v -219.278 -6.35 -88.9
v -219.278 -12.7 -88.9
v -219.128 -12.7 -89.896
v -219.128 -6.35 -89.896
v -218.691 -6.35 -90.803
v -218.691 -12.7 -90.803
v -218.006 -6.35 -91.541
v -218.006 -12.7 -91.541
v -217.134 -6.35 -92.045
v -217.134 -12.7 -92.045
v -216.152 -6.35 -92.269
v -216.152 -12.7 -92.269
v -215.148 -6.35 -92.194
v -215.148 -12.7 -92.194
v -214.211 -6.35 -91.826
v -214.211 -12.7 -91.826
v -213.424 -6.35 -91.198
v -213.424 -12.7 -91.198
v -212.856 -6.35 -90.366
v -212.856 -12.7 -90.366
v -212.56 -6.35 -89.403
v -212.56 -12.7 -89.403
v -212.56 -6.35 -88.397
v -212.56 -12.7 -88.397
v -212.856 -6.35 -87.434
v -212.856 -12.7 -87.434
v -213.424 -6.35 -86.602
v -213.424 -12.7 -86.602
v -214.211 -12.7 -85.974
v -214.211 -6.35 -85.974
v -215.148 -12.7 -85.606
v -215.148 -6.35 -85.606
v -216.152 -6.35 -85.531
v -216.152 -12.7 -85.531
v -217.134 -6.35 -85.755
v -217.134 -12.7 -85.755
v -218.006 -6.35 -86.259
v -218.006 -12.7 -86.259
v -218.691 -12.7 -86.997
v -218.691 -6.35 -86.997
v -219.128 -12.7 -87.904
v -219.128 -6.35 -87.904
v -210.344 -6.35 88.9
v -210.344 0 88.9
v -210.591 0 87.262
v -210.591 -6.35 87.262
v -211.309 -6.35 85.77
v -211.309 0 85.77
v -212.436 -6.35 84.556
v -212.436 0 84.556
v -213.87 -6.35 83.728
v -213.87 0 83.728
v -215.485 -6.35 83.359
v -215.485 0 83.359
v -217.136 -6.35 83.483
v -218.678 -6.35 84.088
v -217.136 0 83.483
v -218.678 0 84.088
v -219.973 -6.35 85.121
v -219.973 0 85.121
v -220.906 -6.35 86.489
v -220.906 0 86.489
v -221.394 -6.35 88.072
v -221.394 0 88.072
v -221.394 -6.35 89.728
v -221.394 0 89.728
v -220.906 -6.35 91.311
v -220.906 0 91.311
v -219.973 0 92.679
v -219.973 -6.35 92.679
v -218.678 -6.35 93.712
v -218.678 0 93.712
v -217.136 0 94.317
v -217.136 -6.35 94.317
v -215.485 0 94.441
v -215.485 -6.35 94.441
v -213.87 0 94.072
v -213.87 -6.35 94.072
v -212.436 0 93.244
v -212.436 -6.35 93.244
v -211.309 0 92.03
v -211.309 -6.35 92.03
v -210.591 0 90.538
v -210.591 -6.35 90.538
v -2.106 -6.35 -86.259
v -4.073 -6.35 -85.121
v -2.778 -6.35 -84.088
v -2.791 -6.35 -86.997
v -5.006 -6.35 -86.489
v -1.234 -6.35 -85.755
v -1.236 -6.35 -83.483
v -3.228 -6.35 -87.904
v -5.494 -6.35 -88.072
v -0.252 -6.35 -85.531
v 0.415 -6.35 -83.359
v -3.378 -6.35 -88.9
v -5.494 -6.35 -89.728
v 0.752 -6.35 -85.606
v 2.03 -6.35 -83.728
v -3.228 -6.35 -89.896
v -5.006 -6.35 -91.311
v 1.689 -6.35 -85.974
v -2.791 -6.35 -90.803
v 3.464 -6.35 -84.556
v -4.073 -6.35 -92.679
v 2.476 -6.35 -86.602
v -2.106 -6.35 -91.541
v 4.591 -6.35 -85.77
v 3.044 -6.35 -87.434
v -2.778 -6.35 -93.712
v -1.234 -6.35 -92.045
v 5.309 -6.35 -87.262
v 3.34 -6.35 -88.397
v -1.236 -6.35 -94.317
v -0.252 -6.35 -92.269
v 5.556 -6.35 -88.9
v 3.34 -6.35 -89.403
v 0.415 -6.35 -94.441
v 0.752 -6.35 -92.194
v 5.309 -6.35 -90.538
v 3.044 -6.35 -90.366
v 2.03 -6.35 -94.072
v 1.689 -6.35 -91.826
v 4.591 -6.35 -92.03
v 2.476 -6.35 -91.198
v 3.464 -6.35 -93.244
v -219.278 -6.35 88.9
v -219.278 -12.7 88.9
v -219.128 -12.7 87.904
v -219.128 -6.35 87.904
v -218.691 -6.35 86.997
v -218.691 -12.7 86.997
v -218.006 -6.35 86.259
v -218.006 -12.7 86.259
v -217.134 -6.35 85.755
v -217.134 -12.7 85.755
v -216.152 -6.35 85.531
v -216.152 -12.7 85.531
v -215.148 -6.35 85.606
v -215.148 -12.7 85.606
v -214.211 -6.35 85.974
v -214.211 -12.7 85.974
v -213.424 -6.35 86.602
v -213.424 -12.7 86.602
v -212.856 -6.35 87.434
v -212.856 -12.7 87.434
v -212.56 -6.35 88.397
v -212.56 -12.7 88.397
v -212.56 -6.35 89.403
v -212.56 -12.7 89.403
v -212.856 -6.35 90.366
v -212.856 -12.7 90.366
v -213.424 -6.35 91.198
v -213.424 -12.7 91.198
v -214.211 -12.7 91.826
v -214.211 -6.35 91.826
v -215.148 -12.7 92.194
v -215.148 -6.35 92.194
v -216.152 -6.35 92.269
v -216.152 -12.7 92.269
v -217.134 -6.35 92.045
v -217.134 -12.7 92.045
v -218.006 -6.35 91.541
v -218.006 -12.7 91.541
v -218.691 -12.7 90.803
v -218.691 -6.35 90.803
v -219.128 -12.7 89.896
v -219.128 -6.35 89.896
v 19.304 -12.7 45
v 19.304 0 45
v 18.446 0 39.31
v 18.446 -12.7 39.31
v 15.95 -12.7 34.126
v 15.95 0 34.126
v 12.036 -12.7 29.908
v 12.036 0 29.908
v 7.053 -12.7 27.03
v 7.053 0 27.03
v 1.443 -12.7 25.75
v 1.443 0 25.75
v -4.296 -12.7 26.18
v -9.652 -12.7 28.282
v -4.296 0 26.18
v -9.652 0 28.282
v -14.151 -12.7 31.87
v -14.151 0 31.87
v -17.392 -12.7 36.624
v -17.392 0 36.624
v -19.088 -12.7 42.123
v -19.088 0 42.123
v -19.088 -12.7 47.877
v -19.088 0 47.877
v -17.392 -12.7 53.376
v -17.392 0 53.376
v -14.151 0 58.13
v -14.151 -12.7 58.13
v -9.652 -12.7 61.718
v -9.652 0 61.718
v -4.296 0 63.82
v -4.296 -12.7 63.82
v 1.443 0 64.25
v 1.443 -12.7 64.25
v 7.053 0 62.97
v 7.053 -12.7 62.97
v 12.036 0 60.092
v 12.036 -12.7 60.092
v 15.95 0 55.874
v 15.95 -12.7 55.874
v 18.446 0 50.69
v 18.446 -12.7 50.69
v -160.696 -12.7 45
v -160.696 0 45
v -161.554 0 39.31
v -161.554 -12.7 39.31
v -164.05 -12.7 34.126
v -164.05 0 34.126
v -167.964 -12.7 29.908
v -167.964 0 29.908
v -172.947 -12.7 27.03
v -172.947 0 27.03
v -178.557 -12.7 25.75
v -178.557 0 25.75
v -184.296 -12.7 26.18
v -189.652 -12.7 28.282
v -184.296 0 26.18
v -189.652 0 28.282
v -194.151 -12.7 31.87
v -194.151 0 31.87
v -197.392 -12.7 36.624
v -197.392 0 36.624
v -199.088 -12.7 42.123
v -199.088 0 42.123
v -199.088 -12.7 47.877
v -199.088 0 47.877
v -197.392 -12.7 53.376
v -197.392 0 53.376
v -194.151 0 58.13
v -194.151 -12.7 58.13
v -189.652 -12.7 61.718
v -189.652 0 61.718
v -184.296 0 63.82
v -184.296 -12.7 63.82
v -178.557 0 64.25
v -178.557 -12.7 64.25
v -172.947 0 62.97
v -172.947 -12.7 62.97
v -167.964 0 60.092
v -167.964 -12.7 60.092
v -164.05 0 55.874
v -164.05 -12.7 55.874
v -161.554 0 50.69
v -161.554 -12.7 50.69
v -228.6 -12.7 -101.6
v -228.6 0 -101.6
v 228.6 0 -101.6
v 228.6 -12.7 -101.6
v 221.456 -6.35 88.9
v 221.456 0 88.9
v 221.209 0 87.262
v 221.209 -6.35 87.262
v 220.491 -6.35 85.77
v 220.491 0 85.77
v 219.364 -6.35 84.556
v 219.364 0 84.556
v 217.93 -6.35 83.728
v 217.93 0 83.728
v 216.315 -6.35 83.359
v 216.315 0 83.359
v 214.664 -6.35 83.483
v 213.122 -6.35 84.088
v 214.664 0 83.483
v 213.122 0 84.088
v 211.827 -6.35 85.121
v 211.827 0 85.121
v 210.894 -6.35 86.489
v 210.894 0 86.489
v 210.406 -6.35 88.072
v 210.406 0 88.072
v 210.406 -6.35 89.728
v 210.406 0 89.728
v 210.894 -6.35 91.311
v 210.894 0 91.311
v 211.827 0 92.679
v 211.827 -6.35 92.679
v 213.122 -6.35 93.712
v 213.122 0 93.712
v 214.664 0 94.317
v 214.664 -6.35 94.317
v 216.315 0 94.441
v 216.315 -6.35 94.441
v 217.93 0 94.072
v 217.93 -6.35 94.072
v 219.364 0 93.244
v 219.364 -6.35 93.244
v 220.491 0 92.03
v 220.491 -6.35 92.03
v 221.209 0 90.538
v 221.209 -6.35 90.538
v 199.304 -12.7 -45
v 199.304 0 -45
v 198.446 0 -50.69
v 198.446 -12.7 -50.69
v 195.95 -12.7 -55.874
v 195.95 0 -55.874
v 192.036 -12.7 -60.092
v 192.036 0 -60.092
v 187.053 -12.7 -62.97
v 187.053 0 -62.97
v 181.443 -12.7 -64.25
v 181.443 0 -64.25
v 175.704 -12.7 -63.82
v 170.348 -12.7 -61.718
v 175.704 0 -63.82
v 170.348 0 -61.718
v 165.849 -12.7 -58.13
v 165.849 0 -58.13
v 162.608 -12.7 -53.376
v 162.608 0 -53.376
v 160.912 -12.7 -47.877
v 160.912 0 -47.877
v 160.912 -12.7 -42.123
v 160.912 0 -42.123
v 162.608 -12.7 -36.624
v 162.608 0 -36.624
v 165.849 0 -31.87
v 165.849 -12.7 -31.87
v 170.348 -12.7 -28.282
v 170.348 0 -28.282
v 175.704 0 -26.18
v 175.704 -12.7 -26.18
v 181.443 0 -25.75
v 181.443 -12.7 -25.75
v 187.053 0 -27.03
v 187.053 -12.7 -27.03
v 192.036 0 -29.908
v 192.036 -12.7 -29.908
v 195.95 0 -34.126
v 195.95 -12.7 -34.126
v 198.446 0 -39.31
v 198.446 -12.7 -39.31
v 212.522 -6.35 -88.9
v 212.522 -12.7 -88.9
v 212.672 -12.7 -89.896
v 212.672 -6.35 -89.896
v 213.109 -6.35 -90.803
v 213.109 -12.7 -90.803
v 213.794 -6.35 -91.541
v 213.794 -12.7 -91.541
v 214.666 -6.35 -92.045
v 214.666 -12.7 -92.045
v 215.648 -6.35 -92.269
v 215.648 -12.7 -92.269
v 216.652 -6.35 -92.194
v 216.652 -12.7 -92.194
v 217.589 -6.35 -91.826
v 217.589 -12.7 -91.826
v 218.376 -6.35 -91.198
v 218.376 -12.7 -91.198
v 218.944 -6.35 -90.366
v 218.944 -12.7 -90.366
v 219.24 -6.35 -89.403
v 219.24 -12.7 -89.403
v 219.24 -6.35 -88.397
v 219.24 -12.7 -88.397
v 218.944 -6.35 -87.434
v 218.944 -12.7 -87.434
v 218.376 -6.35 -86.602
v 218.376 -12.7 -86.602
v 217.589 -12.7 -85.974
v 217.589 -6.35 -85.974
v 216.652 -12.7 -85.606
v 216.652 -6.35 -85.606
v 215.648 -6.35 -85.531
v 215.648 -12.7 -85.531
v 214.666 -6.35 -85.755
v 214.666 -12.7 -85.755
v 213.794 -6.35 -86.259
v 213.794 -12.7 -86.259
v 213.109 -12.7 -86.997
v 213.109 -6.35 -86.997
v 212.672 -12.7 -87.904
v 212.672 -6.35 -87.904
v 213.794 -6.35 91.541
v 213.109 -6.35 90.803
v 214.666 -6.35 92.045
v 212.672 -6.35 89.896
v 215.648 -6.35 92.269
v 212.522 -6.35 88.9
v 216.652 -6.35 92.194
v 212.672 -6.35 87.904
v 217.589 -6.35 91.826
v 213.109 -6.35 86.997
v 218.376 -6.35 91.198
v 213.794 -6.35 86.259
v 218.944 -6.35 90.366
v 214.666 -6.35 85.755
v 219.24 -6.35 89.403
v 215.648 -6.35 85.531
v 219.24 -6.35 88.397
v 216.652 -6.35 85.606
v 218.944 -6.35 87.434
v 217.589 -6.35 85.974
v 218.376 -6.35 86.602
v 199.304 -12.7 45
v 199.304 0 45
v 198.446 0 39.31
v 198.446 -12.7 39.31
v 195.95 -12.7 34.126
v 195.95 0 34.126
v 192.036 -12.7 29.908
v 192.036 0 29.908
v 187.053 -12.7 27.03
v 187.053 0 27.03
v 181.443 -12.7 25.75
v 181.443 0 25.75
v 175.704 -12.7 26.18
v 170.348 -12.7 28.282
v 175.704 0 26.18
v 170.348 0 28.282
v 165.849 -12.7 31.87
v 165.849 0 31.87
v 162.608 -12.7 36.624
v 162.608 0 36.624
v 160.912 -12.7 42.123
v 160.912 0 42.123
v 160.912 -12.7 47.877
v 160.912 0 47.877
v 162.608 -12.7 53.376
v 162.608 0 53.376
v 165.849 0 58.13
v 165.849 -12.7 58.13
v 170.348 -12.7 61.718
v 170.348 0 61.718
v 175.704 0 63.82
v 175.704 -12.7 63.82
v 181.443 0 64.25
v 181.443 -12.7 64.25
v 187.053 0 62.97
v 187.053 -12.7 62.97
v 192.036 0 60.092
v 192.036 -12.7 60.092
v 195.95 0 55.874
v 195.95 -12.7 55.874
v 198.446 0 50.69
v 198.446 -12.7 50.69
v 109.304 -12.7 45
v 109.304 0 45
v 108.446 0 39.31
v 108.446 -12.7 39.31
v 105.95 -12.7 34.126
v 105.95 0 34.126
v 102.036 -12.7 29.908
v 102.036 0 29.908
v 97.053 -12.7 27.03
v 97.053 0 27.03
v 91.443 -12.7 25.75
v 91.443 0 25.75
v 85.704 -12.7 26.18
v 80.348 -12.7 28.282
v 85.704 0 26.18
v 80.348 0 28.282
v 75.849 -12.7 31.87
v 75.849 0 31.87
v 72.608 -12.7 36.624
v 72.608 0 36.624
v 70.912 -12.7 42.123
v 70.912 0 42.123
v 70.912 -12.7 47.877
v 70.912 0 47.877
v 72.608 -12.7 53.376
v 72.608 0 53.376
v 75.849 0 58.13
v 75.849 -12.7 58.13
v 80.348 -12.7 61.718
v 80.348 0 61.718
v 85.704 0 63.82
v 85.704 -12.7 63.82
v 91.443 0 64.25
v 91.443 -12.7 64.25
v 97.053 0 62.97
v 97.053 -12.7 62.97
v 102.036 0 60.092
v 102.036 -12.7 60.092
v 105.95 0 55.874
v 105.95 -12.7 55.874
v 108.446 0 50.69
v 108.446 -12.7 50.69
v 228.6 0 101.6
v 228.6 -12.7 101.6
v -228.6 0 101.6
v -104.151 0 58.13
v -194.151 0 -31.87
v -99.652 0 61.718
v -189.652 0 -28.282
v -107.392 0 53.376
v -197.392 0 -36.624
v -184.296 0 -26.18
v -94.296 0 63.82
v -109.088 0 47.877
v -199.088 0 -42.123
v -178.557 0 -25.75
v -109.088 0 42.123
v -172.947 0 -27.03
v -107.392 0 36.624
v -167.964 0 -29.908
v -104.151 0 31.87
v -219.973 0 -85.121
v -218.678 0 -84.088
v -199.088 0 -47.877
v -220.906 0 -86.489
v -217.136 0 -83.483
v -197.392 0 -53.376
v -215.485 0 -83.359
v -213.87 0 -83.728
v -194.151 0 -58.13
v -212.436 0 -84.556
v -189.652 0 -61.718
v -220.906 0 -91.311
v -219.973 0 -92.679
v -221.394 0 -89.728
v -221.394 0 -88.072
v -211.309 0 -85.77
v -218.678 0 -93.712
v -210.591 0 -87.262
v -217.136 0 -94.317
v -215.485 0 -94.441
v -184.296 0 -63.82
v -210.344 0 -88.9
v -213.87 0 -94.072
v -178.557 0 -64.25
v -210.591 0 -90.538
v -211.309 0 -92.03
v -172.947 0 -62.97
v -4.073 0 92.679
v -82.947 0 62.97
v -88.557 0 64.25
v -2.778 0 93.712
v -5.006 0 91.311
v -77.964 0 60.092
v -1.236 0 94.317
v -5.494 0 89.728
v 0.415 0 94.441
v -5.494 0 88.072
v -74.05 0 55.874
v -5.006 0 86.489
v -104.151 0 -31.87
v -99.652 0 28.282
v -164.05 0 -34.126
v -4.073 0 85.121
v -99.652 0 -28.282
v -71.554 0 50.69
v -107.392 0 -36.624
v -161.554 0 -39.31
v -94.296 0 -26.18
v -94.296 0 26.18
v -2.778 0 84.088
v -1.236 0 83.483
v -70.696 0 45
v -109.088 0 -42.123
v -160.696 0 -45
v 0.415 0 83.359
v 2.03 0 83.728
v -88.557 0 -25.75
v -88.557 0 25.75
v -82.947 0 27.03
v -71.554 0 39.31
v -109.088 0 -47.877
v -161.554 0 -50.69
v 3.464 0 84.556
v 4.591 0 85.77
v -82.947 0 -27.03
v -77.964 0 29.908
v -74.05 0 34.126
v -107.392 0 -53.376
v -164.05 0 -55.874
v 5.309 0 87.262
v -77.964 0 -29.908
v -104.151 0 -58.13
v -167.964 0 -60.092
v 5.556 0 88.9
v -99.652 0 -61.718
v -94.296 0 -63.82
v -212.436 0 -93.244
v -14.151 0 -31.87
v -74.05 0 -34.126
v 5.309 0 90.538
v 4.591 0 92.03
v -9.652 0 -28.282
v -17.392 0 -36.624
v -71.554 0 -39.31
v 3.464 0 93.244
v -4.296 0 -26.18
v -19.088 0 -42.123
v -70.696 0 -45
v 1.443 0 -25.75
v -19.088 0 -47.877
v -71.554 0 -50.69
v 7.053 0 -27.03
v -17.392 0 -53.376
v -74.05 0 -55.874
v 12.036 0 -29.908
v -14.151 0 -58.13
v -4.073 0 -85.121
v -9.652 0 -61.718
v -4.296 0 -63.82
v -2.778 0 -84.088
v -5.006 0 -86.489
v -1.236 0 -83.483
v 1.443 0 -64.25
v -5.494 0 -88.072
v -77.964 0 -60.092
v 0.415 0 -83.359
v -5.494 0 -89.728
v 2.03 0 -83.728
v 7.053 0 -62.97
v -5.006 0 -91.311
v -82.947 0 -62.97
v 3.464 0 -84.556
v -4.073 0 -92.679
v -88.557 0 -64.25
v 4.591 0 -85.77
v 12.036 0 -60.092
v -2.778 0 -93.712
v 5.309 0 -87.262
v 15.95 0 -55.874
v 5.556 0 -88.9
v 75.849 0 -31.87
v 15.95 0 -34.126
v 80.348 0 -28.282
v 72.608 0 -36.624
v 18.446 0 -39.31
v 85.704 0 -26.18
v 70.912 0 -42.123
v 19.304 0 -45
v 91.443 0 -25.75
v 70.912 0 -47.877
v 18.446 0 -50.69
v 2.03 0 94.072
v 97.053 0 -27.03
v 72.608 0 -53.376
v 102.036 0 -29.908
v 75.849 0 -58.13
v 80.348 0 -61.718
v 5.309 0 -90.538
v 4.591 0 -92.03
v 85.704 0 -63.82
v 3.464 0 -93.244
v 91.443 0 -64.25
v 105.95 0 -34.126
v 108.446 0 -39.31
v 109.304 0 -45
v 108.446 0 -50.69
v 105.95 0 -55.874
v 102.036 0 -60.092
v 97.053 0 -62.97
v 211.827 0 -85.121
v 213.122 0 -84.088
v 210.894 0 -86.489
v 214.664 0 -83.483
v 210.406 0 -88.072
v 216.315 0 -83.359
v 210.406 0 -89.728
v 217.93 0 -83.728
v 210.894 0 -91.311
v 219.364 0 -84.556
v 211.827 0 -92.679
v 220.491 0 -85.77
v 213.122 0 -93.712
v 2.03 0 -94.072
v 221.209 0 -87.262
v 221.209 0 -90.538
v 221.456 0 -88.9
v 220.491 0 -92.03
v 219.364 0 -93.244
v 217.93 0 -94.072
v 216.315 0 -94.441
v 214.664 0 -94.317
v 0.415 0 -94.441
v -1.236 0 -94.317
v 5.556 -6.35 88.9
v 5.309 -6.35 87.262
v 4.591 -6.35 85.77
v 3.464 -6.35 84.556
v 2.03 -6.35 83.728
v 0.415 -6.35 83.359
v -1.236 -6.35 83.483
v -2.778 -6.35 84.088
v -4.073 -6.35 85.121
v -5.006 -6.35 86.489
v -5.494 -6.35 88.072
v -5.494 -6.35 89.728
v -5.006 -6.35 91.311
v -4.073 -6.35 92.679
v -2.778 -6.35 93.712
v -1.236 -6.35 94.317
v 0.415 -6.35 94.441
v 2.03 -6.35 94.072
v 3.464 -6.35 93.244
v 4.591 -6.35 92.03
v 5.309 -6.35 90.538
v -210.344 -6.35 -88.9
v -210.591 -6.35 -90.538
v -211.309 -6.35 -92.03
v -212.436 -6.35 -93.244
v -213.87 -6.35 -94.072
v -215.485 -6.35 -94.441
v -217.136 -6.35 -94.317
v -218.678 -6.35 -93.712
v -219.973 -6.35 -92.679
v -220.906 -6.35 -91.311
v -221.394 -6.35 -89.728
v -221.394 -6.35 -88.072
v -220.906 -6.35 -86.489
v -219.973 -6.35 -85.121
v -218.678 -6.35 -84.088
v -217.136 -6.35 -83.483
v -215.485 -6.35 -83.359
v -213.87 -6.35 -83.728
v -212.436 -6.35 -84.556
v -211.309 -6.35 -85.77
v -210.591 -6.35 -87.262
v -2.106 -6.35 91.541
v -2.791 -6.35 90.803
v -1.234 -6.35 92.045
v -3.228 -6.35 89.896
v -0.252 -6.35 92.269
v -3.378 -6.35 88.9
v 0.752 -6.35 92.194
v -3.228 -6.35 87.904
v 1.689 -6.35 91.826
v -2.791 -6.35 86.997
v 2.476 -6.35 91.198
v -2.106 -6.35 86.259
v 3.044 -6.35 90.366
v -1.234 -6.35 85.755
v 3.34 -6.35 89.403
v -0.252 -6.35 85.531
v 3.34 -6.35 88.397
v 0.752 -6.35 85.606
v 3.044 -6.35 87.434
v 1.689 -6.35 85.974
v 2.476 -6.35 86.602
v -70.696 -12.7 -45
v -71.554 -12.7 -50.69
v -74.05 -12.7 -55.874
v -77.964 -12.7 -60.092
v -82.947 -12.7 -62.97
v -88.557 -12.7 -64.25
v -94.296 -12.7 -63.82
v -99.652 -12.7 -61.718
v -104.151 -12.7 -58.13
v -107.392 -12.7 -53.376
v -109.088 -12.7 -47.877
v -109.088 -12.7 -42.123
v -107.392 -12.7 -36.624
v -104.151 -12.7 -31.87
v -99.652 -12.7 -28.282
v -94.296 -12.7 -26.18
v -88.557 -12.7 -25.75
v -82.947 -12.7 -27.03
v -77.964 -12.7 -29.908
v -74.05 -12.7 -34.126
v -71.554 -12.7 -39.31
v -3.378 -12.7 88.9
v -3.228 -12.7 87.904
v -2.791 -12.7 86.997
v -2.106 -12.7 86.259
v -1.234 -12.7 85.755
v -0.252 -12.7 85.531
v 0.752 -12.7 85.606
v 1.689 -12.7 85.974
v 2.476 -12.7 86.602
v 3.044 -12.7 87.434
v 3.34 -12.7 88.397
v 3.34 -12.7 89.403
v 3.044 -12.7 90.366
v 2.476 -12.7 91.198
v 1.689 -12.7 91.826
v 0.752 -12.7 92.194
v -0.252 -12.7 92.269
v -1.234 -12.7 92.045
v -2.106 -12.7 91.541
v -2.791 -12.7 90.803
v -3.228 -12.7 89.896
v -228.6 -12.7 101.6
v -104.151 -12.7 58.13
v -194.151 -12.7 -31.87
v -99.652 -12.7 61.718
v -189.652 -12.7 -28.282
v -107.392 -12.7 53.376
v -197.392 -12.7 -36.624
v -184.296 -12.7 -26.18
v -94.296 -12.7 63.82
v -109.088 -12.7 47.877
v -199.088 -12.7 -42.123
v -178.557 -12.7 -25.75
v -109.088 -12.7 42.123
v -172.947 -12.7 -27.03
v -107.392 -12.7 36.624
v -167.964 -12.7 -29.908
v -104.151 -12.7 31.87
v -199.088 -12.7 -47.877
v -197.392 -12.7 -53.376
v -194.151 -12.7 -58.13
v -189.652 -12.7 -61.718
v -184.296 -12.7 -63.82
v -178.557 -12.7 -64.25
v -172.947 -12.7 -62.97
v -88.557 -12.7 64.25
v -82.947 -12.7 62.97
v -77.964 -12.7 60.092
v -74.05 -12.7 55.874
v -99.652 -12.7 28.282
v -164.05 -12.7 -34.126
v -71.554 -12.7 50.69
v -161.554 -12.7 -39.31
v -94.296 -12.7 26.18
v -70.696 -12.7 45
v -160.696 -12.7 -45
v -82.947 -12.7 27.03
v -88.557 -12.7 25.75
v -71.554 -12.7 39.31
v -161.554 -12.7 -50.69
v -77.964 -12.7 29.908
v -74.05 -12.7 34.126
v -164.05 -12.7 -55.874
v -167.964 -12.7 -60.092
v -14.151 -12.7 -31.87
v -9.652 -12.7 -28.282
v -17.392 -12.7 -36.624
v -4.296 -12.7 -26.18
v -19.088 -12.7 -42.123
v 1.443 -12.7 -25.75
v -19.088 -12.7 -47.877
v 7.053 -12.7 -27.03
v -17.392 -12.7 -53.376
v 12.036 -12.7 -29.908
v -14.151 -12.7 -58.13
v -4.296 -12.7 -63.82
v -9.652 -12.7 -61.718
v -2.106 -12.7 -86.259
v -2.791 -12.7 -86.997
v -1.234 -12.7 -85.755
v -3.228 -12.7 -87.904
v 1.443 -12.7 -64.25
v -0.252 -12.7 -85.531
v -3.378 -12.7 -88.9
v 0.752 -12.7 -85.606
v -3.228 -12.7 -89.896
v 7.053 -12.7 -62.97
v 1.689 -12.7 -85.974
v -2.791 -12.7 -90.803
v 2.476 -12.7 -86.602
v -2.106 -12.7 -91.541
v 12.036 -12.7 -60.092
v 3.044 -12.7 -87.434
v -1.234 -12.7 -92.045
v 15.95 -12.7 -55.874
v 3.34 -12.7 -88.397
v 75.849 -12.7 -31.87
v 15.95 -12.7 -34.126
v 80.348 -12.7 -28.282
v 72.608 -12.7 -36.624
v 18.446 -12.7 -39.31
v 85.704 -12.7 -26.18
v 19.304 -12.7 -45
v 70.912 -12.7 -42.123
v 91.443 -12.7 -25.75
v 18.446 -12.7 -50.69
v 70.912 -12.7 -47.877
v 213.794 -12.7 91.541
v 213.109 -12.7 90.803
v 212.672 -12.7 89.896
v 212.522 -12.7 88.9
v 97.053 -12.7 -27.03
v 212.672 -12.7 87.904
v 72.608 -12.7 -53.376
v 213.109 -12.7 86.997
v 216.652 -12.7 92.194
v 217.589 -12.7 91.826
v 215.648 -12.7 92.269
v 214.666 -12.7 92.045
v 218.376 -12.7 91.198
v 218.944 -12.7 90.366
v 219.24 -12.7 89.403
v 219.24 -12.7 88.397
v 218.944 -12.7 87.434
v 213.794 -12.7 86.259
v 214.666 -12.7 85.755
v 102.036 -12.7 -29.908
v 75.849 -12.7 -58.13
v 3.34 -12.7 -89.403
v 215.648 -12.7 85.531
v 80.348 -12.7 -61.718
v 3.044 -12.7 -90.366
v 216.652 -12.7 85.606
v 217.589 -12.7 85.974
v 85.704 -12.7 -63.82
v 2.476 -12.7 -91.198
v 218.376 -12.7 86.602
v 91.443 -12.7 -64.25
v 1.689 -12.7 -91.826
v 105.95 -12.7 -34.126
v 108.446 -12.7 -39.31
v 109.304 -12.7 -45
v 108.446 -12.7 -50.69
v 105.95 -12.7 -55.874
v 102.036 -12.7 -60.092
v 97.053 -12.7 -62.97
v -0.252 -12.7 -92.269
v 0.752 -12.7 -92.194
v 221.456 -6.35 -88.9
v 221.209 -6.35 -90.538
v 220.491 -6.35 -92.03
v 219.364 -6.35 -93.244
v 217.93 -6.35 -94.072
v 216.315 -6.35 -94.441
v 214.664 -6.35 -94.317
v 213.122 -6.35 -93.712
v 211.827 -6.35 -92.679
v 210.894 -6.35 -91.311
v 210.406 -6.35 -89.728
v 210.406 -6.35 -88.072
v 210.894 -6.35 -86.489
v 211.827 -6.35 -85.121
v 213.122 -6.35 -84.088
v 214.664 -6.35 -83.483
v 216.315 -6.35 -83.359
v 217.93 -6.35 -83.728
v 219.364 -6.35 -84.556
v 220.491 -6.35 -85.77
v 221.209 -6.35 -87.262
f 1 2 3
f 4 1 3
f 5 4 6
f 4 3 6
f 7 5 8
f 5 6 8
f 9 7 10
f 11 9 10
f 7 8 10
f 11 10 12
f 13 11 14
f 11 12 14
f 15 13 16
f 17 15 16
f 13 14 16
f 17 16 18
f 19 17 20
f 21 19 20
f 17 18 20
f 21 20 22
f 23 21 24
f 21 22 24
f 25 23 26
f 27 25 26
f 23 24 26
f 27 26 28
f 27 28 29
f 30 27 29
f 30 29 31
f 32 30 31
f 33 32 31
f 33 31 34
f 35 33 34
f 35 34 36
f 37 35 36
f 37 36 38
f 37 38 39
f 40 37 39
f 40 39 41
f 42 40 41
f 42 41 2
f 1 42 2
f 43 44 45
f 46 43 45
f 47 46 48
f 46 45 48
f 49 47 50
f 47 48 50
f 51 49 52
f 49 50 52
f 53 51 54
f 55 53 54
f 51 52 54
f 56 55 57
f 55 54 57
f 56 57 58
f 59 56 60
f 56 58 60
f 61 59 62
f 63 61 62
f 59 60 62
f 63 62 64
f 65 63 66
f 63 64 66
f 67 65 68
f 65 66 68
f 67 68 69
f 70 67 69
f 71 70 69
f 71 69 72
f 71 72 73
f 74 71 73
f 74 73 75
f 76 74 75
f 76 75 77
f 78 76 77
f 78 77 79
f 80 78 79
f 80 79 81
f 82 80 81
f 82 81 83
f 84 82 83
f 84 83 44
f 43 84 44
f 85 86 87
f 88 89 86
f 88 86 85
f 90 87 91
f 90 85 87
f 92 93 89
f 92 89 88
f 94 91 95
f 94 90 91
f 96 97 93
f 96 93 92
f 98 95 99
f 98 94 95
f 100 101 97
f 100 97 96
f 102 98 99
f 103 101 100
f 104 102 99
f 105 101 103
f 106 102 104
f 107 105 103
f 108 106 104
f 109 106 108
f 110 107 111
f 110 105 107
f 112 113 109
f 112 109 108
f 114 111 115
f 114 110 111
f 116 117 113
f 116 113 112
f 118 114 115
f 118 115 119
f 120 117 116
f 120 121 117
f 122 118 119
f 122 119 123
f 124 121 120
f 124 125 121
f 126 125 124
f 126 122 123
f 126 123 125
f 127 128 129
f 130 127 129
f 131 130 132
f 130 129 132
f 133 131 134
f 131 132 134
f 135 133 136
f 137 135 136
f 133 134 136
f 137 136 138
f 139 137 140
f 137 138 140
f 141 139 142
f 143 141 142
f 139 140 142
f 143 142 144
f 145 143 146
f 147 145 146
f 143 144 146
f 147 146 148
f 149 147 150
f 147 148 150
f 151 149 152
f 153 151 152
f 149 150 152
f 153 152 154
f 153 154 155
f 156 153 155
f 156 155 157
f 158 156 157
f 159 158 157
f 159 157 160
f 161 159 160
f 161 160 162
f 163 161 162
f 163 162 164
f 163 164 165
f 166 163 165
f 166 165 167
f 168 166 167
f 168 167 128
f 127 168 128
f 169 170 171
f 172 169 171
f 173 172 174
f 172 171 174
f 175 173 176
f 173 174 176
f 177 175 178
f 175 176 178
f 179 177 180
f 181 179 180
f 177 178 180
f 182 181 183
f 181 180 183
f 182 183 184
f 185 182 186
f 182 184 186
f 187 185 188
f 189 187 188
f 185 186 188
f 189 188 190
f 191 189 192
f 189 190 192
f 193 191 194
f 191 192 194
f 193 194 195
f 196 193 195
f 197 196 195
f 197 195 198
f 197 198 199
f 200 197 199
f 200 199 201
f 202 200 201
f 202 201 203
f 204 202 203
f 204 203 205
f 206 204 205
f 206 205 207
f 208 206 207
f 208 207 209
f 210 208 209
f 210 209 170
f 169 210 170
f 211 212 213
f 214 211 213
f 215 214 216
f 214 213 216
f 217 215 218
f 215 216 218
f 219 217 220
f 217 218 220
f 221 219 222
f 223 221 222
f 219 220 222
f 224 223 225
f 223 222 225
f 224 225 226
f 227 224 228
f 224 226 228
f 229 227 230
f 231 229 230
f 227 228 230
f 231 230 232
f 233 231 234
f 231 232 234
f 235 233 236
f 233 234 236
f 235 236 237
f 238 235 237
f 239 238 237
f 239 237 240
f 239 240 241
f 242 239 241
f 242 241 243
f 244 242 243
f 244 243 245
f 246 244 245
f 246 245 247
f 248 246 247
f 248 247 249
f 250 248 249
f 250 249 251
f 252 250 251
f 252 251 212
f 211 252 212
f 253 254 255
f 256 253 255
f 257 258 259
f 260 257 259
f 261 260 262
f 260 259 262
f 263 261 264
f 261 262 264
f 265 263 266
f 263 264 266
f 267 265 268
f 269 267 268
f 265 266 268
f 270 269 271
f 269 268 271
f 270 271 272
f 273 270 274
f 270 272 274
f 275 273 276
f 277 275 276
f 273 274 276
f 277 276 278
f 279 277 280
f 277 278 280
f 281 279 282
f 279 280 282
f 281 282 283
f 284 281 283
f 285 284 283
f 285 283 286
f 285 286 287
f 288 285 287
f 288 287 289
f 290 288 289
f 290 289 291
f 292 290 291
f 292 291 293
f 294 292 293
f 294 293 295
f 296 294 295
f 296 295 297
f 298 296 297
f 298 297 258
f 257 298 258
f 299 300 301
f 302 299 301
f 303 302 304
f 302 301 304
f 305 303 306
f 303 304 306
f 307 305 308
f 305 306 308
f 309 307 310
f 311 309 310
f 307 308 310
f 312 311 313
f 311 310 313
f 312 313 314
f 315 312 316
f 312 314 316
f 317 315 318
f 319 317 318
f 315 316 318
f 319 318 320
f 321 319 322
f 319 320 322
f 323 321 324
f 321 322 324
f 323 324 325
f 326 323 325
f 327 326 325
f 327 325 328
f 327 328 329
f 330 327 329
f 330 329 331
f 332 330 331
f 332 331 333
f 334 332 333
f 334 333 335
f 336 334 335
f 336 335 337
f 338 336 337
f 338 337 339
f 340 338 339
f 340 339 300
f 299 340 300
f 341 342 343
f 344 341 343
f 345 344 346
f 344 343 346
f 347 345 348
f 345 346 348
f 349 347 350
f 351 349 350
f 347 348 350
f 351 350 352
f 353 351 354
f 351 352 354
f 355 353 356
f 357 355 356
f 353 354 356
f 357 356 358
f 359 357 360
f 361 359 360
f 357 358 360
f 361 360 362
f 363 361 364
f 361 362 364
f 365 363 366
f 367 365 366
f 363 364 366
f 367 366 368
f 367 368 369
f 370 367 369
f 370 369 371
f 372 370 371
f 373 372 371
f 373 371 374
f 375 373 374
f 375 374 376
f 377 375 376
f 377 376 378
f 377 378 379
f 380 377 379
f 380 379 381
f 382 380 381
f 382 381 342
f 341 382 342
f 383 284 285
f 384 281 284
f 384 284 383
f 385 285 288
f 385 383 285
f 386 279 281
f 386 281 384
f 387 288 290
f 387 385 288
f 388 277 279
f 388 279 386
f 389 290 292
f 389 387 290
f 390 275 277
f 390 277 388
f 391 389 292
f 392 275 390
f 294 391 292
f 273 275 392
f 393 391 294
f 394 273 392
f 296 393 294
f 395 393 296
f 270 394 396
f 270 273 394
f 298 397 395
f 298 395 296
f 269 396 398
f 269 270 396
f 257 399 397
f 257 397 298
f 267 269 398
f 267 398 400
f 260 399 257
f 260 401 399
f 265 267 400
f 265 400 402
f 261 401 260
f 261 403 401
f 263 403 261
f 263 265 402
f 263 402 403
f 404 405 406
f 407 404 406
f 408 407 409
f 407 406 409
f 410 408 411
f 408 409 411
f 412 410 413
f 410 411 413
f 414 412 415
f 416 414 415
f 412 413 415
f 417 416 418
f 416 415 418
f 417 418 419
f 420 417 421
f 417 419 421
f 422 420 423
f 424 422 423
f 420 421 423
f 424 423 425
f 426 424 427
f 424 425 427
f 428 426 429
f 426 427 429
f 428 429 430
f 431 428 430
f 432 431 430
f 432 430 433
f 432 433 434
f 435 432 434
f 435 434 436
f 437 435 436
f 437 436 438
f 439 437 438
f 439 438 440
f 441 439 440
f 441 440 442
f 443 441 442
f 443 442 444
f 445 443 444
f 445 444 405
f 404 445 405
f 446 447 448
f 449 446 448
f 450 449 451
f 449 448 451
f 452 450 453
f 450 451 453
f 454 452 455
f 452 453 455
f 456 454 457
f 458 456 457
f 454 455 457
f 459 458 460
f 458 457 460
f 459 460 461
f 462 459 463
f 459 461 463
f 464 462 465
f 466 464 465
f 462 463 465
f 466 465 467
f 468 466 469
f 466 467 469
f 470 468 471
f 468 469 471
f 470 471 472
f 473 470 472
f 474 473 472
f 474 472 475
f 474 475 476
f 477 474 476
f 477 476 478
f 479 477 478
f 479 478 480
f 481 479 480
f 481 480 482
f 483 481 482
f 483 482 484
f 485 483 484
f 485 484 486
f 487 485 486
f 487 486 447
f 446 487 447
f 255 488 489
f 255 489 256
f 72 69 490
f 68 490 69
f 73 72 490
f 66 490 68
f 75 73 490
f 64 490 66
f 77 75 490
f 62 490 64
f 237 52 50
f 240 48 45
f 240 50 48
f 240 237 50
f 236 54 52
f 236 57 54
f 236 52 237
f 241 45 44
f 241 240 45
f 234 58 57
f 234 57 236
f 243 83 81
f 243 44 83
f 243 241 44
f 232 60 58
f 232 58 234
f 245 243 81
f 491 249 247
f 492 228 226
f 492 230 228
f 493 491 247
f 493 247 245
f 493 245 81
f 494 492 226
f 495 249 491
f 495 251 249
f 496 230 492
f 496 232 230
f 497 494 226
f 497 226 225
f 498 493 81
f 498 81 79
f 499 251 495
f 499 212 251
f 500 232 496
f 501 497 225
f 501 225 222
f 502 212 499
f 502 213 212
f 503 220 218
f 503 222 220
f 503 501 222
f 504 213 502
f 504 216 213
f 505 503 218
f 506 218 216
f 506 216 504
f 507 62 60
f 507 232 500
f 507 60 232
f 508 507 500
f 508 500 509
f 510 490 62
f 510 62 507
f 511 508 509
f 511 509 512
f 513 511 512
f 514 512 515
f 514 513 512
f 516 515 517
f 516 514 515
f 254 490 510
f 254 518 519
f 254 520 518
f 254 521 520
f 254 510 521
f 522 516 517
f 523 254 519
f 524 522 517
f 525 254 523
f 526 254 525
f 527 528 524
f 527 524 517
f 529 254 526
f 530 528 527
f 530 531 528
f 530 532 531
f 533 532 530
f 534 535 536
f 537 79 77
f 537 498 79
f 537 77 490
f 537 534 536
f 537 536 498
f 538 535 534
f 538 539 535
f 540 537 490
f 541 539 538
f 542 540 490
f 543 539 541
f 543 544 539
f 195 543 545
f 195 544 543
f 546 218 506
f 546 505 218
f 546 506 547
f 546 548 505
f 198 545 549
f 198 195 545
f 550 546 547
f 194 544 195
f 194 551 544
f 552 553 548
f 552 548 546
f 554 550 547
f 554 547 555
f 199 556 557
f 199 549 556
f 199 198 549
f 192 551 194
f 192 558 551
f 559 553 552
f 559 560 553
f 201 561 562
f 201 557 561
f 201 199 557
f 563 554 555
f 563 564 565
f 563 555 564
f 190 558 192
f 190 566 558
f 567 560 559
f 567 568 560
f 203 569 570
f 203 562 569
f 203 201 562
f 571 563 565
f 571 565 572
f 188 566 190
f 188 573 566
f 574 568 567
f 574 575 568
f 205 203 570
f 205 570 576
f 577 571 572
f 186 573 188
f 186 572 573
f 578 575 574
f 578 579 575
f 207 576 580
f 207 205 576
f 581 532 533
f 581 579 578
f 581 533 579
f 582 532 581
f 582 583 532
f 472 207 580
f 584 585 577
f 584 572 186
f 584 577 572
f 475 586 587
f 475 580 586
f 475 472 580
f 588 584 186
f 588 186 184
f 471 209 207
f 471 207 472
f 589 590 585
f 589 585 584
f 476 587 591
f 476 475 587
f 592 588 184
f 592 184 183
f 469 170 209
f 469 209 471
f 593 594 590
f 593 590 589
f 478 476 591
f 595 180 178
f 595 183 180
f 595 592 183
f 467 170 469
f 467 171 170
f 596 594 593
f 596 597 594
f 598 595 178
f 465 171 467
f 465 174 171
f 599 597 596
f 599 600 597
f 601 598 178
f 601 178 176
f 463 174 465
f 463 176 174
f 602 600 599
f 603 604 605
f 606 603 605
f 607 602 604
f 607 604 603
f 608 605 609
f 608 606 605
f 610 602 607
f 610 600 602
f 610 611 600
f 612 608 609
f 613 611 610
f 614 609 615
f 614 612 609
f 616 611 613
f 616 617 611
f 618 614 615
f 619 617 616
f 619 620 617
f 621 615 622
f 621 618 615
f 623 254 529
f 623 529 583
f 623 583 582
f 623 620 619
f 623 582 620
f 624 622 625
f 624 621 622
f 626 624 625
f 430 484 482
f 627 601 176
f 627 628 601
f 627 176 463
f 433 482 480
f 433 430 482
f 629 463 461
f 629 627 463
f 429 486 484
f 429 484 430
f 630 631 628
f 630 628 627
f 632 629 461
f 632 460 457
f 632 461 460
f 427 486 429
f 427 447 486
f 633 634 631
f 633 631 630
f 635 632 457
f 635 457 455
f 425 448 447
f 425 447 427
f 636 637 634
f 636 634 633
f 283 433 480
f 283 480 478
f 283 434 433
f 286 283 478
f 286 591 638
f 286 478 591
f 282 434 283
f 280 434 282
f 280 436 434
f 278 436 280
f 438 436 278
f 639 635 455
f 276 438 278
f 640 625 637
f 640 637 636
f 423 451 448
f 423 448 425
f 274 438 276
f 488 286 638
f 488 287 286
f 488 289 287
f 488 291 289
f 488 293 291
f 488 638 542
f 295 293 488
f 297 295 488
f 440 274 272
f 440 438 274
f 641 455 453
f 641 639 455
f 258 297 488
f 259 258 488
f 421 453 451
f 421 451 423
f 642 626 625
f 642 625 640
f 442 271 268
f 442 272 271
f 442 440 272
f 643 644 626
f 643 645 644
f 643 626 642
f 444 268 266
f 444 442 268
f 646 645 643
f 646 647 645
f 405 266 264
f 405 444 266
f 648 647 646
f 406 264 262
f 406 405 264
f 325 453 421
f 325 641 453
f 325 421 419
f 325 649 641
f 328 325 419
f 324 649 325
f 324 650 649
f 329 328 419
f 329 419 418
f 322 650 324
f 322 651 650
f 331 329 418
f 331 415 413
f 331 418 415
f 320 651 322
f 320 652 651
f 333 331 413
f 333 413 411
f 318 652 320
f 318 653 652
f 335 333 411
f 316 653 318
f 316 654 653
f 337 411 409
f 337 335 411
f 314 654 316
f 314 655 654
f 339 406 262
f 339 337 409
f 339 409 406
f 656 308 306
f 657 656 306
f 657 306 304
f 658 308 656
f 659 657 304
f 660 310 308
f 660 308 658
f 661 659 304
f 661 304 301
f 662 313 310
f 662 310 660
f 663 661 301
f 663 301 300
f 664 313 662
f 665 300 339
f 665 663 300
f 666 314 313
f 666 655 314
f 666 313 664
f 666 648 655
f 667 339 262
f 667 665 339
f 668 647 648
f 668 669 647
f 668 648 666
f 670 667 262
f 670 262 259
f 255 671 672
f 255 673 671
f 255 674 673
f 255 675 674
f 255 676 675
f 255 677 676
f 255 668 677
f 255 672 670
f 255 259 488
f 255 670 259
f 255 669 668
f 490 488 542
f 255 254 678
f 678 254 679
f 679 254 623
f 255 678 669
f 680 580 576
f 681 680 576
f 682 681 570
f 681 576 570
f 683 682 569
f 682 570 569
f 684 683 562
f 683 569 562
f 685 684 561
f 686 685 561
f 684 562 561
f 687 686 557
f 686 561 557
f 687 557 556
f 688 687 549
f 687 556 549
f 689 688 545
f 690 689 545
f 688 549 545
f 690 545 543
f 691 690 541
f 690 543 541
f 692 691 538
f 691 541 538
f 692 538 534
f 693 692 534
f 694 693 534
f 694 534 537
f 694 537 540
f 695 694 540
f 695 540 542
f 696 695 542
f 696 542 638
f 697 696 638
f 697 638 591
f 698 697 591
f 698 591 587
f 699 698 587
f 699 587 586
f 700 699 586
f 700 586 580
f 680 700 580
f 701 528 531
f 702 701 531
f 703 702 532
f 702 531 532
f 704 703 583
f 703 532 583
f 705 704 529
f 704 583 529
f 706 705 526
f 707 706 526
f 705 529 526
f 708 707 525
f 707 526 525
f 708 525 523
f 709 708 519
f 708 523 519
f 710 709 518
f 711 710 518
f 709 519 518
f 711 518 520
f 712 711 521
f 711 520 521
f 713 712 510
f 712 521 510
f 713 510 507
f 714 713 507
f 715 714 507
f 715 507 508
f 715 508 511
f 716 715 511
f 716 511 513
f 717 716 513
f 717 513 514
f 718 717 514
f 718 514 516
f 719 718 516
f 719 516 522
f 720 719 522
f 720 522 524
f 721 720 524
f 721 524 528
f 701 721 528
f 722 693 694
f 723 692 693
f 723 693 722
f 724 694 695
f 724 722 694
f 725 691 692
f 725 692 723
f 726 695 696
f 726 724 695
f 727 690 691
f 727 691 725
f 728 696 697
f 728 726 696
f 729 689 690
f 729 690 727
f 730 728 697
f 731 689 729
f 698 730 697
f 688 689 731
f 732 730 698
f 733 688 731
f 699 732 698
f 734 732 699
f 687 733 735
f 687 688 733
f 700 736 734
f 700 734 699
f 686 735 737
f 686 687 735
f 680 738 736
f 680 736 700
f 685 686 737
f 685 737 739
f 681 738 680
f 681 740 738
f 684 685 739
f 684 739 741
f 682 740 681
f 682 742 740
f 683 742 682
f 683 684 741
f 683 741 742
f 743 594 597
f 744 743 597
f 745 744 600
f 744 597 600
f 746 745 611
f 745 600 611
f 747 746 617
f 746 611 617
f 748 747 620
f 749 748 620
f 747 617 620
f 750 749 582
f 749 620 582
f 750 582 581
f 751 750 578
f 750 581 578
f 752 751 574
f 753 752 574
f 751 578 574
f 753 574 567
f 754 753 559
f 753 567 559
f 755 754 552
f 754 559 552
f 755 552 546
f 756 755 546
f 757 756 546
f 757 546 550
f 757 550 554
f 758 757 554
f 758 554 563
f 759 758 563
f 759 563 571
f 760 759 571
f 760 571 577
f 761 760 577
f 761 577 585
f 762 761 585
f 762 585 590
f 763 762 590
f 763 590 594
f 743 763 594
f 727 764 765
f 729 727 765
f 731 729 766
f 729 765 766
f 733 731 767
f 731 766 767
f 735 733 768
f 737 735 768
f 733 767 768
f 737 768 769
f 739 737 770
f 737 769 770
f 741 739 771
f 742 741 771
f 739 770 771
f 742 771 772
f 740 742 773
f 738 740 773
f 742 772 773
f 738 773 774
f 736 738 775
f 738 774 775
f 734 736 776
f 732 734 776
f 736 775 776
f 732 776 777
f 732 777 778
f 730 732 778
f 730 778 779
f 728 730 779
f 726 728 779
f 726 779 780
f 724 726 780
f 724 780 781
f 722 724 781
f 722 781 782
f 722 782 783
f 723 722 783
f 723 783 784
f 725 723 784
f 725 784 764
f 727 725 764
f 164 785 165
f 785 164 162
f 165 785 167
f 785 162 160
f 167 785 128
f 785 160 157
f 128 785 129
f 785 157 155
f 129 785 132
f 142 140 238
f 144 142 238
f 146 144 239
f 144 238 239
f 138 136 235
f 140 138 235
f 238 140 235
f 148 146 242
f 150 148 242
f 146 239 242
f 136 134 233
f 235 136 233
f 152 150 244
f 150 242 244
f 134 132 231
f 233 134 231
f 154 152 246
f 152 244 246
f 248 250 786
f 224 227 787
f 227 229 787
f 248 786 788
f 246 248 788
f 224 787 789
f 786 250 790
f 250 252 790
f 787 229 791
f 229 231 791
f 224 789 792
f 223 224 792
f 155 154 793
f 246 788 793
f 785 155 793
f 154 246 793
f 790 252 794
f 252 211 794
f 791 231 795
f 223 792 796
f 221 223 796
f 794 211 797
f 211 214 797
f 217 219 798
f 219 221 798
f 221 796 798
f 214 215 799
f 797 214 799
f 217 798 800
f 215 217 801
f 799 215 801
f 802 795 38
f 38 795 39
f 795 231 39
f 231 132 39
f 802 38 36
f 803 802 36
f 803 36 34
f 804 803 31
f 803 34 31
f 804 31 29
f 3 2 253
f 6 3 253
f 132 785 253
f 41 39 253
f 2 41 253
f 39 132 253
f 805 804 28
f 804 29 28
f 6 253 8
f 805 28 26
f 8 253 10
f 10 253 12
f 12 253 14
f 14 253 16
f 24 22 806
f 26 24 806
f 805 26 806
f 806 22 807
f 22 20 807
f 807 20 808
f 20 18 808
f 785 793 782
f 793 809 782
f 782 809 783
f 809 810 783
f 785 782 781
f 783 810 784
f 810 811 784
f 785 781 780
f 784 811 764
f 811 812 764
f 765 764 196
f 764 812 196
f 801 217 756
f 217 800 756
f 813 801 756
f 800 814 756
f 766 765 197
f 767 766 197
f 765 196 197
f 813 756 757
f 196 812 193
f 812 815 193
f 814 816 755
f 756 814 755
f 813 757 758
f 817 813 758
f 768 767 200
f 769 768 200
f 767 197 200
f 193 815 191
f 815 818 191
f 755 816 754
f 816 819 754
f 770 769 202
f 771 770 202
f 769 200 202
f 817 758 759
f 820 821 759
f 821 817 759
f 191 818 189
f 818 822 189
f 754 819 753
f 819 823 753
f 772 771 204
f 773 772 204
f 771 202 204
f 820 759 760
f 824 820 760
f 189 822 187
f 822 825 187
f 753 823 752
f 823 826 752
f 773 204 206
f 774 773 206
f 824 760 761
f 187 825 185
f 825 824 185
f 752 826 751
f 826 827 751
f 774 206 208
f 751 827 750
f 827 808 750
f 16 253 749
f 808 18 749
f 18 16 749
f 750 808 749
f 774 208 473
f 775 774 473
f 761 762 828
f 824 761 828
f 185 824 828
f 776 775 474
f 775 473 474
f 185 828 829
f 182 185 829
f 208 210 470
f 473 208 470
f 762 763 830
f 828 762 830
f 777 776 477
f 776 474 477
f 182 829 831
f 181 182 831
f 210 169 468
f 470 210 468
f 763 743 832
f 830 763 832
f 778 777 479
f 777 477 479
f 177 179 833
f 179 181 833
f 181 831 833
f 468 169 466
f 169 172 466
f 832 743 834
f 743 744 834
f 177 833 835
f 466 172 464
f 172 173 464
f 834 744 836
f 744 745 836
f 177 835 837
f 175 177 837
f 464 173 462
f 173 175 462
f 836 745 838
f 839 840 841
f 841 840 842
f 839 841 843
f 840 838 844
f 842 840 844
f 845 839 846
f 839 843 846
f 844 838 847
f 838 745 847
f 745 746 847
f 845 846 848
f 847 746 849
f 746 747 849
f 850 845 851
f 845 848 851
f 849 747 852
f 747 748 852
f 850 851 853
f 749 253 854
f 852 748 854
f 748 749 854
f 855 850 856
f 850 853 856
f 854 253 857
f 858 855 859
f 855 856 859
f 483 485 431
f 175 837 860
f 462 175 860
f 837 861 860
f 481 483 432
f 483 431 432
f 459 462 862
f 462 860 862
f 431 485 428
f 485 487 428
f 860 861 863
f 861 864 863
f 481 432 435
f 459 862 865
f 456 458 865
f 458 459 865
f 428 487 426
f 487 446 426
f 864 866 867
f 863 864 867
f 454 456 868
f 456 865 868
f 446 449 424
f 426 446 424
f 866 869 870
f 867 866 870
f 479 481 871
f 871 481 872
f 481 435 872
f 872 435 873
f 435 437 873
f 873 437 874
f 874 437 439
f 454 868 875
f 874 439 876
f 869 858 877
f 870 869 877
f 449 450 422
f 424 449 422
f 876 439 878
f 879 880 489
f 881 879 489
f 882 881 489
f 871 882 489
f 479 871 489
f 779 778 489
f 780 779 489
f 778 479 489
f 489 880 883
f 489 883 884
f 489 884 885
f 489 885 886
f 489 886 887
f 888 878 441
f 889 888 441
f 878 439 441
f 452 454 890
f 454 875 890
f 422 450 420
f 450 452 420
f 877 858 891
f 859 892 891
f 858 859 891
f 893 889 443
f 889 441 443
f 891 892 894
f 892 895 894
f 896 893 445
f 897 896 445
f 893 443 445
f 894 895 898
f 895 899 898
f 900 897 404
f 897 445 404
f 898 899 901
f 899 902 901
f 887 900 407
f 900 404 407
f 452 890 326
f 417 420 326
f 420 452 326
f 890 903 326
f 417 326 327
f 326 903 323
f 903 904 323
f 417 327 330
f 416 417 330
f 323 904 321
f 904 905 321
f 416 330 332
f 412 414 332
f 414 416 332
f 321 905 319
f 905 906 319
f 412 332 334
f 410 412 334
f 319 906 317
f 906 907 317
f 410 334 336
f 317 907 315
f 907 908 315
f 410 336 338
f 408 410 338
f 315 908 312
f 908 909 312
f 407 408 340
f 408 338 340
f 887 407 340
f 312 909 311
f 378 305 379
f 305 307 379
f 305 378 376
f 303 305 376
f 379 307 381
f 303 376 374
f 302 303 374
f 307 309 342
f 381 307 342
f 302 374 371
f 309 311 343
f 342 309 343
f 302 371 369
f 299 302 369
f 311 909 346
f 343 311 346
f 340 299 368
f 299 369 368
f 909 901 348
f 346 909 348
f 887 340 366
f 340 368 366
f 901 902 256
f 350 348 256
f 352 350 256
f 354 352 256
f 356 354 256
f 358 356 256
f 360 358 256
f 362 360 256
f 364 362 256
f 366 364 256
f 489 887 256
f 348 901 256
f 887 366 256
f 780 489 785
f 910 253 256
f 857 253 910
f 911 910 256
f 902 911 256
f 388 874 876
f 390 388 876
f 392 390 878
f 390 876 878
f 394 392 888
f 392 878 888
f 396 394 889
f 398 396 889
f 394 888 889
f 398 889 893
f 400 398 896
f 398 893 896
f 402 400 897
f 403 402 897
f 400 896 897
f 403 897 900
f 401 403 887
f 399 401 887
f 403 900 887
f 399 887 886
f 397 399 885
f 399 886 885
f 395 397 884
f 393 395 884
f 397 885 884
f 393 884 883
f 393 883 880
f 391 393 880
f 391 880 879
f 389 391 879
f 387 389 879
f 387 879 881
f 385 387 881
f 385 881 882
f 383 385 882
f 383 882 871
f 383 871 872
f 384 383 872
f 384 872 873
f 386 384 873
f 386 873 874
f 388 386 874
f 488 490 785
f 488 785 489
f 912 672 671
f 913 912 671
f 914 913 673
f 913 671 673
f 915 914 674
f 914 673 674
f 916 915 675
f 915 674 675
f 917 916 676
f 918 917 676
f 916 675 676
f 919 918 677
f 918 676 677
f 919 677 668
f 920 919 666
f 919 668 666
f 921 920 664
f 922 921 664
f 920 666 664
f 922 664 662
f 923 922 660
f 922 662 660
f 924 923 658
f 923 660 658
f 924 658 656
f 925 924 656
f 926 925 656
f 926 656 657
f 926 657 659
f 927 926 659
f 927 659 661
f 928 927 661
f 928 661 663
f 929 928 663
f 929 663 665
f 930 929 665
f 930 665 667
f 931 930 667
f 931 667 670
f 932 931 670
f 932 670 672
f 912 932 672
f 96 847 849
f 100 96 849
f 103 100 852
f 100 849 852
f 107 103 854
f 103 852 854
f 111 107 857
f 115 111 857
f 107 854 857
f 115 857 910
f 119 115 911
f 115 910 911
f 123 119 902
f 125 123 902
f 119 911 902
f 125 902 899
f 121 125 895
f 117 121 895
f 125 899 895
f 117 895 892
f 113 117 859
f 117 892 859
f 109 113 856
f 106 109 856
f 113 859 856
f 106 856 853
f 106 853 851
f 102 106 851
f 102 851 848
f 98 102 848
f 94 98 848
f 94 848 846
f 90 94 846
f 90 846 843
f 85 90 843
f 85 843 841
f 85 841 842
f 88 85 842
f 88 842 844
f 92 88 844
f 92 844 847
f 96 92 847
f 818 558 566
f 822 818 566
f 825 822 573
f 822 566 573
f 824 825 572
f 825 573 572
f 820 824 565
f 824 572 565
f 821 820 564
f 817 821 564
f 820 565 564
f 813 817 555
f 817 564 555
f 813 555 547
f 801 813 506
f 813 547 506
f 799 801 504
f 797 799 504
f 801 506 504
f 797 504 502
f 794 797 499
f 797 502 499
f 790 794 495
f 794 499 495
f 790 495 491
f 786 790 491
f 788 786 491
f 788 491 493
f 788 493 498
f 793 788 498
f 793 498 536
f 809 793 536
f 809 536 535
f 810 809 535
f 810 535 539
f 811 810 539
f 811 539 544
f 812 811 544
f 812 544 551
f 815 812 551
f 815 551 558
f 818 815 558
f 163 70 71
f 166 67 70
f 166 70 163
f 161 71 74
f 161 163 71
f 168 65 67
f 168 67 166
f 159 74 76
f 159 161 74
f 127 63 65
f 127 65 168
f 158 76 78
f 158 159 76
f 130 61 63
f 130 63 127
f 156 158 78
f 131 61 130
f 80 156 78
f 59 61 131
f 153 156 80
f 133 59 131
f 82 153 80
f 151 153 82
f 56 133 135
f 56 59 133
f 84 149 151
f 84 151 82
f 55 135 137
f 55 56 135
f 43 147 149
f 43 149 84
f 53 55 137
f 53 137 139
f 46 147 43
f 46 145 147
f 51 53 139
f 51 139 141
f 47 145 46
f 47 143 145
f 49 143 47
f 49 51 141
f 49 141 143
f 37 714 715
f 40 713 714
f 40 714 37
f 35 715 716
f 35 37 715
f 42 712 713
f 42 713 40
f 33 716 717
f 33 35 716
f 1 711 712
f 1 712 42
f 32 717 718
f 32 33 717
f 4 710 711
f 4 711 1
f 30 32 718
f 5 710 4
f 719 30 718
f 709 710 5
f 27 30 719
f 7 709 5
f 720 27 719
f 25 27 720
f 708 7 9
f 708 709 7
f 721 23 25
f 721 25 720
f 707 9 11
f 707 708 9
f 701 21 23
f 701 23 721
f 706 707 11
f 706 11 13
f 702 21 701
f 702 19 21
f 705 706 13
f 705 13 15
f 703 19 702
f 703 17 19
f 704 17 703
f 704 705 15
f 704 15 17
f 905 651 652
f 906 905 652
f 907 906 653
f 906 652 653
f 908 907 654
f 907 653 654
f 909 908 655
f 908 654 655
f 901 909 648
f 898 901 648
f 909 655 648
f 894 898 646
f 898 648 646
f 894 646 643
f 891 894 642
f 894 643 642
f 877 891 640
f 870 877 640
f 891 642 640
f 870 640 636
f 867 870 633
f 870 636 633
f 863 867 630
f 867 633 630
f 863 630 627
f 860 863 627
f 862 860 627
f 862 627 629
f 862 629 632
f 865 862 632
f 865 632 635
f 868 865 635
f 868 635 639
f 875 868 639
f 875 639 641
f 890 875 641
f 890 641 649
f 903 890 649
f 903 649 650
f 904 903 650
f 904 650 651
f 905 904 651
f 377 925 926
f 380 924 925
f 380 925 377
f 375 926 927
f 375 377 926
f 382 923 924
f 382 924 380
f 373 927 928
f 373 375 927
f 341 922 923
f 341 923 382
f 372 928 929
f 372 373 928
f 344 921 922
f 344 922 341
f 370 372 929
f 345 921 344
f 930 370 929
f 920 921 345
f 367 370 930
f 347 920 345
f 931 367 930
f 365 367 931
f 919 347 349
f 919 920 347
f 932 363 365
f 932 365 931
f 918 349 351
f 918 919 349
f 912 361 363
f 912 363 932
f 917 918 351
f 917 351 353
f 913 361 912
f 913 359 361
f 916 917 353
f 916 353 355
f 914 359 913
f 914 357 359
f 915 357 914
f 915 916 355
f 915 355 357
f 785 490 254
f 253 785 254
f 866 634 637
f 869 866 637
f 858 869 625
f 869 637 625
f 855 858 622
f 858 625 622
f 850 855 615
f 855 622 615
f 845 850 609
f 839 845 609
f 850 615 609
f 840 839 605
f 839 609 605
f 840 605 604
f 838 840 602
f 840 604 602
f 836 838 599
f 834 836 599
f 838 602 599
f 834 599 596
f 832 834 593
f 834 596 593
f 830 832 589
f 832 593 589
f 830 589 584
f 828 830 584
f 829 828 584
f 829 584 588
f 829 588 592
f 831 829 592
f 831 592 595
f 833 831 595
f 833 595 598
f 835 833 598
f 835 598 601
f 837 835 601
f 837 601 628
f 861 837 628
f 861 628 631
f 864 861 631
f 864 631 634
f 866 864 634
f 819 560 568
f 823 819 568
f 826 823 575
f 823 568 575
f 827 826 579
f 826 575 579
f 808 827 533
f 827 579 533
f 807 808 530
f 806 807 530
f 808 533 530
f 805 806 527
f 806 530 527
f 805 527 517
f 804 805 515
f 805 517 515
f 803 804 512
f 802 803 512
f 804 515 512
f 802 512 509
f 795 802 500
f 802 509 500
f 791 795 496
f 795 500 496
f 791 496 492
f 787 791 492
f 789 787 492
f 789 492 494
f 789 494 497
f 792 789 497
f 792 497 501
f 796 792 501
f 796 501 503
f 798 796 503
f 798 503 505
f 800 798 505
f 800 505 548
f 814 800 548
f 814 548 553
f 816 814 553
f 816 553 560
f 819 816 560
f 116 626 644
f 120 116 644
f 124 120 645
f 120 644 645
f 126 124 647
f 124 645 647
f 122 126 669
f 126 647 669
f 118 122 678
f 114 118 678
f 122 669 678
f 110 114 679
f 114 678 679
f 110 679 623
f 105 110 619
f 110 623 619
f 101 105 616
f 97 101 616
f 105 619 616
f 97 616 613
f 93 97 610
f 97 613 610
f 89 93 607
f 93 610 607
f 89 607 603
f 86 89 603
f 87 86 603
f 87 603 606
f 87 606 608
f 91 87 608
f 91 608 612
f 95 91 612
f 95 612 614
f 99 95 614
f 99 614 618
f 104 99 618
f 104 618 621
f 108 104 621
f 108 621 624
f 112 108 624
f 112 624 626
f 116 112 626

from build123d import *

# Parameters (mm, degrees)
SKETCH1_W                                        = 457.2
SKETCH1_H                                        = 203.2
BOSS_EXTRUDE1_DEPTH                              = 12.7
CUT_EXTRUDE1_REACH                               = 14.7
SKETCH2_R                                        = 19.304
CBORE_FOR_1_4_SOCKET_HEAD_CAP_SCREW1_D           = 6.7564
CBORE_FOR_1_4_SOCKET_HEAD_CAP_SCREW1_DEPTH       = 12.7
CBORE_FOR_1_4_SOCKET_HEAD_CAP_SCREW1_CBORE_D     = 11.1125
CBORE_FOR_1_4_SOCKET_HEAD_CAP_SCREW1_CBORE_DEPTH = 6.35


with BuildPart() as part:
    # Sketch1 → Boss-Extrude1 (new body)
    with BuildSketch(Plane(origin=(0, 0, 0), x_dir=(1, 0, 0), z_dir=(0, 1, 0))):
        Rectangle(SKETCH1_W, SKETCH1_H)
    extrude(amount=-BOSS_EXTRUDE1_DEPTH)

    # Sketch2 → Cut-Extrude1 (cut, up to next)
    with BuildSketch(Plane(origin=(0, 0, 0), x_dir=(1, 0, 0), z_dir=(0, 1, 0)), mode=Mode.PRIVATE) as cut_extrude1_sk1:
        with Locations((-180, 45)):
            Circle(SKETCH2_R)
    cut_extrude1_tool1 = extrude(cut_extrude1_sk1.sketch, amount=-CUT_EXTRUDE1_REACH, mode=Mode.PRIVATE) & part.part
    add(cut_extrude1_tool1.solids().sort_by_distance((-180, 0, -45))[0], mode=Mode.SUBTRACT)
    # Sketch2 → Cut-Extrude1 (cut, up to next)
    with BuildSketch(Plane(origin=(0, 0, 0), x_dir=(1, 0, 0), z_dir=(0, 1, 0)), mode=Mode.PRIVATE) as cut_extrude1_sk2:
        with Locations((-90, 45)):
            Circle(SKETCH2_R)
    cut_extrude1_tool2 = extrude(cut_extrude1_sk2.sketch, amount=-CUT_EXTRUDE1_REACH, mode=Mode.PRIVATE) & part.part
    add(cut_extrude1_tool2.solids().sort_by_distance((-90, 0, -45))[0], mode=Mode.SUBTRACT)
    # Sketch2 → Cut-Extrude1 (cut, up to next)
    with BuildSketch(Plane(origin=(0, 0, 0), x_dir=(1, 0, 0), z_dir=(0, 1, 0)), mode=Mode.PRIVATE) as cut_extrude1_sk3:
        with Locations((0, 45)):
            Circle(SKETCH2_R)
    cut_extrude1_tool3 = extrude(cut_extrude1_sk3.sketch, amount=-CUT_EXTRUDE1_REACH, mode=Mode.PRIVATE) & part.part
    add(cut_extrude1_tool3.solids().sort_by_distance((0, 0, -45))[0], mode=Mode.SUBTRACT)
    # Sketch2 → Cut-Extrude1 (cut, up to next)
    with BuildSketch(Plane(origin=(0, 0, 0), x_dir=(1, 0, 0), z_dir=(0, 1, 0)), mode=Mode.PRIVATE) as cut_extrude1_sk4:
        with Locations((-180, -45)):
            Circle(SKETCH2_R)
    cut_extrude1_tool4 = extrude(cut_extrude1_sk4.sketch, amount=-CUT_EXTRUDE1_REACH, mode=Mode.PRIVATE) & part.part
    add(cut_extrude1_tool4.solids().sort_by_distance((-180, 0, 45))[0], mode=Mode.SUBTRACT)
    # Sketch2 → Cut-Extrude1 (cut, up to next)
    with BuildSketch(Plane(origin=(0, 0, 0), x_dir=(1, 0, 0), z_dir=(0, 1, 0)), mode=Mode.PRIVATE) as cut_extrude1_sk5:
        with Locations((-90, -45)):
            Circle(SKETCH2_R)
    cut_extrude1_tool5 = extrude(cut_extrude1_sk5.sketch, amount=-CUT_EXTRUDE1_REACH, mode=Mode.PRIVATE) & part.part
    add(cut_extrude1_tool5.solids().sort_by_distance((-90, 0, 45))[0], mode=Mode.SUBTRACT)
    # Sketch2 → Cut-Extrude1 (cut, up to next)
    with BuildSketch(Plane(origin=(0, 0, 0), x_dir=(1, 0, 0), z_dir=(0, 1, 0)), mode=Mode.PRIVATE) as cut_extrude1_sk6:
        with Locations((0, -45)):
            Circle(SKETCH2_R)
    cut_extrude1_tool6 = extrude(cut_extrude1_sk6.sketch, amount=-CUT_EXTRUDE1_REACH, mode=Mode.PRIVATE) & part.part
    add(cut_extrude1_tool6.solids().sort_by_distance((0, 0, 45))[0], mode=Mode.SUBTRACT)
    # Sketch2 → Cut-Extrude1 (cut, up to next)
    with BuildSketch(Plane(origin=(0, 0, 0), x_dir=(1, 0, 0), z_dir=(0, 1, 0)), mode=Mode.PRIVATE) as cut_extrude1_sk7:
        with Locations((90, -45)):
            Circle(SKETCH2_R)
    cut_extrude1_tool7 = extrude(cut_extrude1_sk7.sketch, amount=-CUT_EXTRUDE1_REACH, mode=Mode.PRIVATE) & part.part
    add(cut_extrude1_tool7.solids().sort_by_distance((90, 0, 45))[0], mode=Mode.SUBTRACT)
    # Sketch2 → Cut-Extrude1 (cut, up to next)
    with BuildSketch(Plane(origin=(0, 0, 0), x_dir=(1, 0, 0), z_dir=(0, 1, 0)), mode=Mode.PRIVATE) as cut_extrude1_sk8:
        with Locations((90, 45)):
            Circle(SKETCH2_R)
    cut_extrude1_tool8 = extrude(cut_extrude1_sk8.sketch, amount=-CUT_EXTRUDE1_REACH, mode=Mode.PRIVATE) & part.part
    add(cut_extrude1_tool8.solids().sort_by_distance((90, 0, -45))[0], mode=Mode.SUBTRACT)
    # Sketch2 → Cut-Extrude1 (cut, up to next)
    with BuildSketch(Plane(origin=(0, 0, 0), x_dir=(1, 0, 0), z_dir=(0, 1, 0)), mode=Mode.PRIVATE) as cut_extrude1_sk9:
        with Locations((180, 45)):
            Circle(SKETCH2_R)
    cut_extrude1_tool9 = extrude(cut_extrude1_sk9.sketch, amount=-CUT_EXTRUDE1_REACH, mode=Mode.PRIVATE) & part.part
    add(cut_extrude1_tool9.solids().sort_by_distance((180, 0, -45))[0], mode=Mode.SUBTRACT)
    # Sketch2 → Cut-Extrude1 (cut, up to next)
    with BuildSketch(Plane(origin=(0, 0, 0), x_dir=(1, 0, 0), z_dir=(0, 1, 0)), mode=Mode.PRIVATE) as cut_extrude1_sk10:
        with Locations((180, -45)):
            Circle(SKETCH2_R)
    cut_extrude1_tool10 = extrude(cut_extrude1_sk10.sketch, amount=-CUT_EXTRUDE1_REACH, mode=Mode.PRIVATE) & part.part
    add(cut_extrude1_tool10.solids().sort_by_distance((180, 0, 45))[0], mode=Mode.SUBTRACT)

    # CBORE for 1/4 Socket Head Cap Screw1
    with Locations(Plane(origin=(0, 0, 0), x_dir=(1, 0, 0), z_dir=(0, 1, 0))):
        with Locations((-215.9, -88.9), (0, -88.9), (215.9, -88.9), (215.9, 88.9), (0, 88.9), (-215.9, 88.9)):
            CounterBoreHole(CBORE_FOR_1_4_SOCKET_HEAD_CAP_SCREW1_D / 2, CBORE_FOR_1_4_SOCKET_HEAD_CAP_SCREW1_CBORE_D / 2, CBORE_FOR_1_4_SOCKET_HEAD_CAP_SCREW1_CBORE_DEPTH, depth=CBORE_FOR_1_4_SOCKET_HEAD_CAP_SCREW1_DEPTH)


solid = part.part
